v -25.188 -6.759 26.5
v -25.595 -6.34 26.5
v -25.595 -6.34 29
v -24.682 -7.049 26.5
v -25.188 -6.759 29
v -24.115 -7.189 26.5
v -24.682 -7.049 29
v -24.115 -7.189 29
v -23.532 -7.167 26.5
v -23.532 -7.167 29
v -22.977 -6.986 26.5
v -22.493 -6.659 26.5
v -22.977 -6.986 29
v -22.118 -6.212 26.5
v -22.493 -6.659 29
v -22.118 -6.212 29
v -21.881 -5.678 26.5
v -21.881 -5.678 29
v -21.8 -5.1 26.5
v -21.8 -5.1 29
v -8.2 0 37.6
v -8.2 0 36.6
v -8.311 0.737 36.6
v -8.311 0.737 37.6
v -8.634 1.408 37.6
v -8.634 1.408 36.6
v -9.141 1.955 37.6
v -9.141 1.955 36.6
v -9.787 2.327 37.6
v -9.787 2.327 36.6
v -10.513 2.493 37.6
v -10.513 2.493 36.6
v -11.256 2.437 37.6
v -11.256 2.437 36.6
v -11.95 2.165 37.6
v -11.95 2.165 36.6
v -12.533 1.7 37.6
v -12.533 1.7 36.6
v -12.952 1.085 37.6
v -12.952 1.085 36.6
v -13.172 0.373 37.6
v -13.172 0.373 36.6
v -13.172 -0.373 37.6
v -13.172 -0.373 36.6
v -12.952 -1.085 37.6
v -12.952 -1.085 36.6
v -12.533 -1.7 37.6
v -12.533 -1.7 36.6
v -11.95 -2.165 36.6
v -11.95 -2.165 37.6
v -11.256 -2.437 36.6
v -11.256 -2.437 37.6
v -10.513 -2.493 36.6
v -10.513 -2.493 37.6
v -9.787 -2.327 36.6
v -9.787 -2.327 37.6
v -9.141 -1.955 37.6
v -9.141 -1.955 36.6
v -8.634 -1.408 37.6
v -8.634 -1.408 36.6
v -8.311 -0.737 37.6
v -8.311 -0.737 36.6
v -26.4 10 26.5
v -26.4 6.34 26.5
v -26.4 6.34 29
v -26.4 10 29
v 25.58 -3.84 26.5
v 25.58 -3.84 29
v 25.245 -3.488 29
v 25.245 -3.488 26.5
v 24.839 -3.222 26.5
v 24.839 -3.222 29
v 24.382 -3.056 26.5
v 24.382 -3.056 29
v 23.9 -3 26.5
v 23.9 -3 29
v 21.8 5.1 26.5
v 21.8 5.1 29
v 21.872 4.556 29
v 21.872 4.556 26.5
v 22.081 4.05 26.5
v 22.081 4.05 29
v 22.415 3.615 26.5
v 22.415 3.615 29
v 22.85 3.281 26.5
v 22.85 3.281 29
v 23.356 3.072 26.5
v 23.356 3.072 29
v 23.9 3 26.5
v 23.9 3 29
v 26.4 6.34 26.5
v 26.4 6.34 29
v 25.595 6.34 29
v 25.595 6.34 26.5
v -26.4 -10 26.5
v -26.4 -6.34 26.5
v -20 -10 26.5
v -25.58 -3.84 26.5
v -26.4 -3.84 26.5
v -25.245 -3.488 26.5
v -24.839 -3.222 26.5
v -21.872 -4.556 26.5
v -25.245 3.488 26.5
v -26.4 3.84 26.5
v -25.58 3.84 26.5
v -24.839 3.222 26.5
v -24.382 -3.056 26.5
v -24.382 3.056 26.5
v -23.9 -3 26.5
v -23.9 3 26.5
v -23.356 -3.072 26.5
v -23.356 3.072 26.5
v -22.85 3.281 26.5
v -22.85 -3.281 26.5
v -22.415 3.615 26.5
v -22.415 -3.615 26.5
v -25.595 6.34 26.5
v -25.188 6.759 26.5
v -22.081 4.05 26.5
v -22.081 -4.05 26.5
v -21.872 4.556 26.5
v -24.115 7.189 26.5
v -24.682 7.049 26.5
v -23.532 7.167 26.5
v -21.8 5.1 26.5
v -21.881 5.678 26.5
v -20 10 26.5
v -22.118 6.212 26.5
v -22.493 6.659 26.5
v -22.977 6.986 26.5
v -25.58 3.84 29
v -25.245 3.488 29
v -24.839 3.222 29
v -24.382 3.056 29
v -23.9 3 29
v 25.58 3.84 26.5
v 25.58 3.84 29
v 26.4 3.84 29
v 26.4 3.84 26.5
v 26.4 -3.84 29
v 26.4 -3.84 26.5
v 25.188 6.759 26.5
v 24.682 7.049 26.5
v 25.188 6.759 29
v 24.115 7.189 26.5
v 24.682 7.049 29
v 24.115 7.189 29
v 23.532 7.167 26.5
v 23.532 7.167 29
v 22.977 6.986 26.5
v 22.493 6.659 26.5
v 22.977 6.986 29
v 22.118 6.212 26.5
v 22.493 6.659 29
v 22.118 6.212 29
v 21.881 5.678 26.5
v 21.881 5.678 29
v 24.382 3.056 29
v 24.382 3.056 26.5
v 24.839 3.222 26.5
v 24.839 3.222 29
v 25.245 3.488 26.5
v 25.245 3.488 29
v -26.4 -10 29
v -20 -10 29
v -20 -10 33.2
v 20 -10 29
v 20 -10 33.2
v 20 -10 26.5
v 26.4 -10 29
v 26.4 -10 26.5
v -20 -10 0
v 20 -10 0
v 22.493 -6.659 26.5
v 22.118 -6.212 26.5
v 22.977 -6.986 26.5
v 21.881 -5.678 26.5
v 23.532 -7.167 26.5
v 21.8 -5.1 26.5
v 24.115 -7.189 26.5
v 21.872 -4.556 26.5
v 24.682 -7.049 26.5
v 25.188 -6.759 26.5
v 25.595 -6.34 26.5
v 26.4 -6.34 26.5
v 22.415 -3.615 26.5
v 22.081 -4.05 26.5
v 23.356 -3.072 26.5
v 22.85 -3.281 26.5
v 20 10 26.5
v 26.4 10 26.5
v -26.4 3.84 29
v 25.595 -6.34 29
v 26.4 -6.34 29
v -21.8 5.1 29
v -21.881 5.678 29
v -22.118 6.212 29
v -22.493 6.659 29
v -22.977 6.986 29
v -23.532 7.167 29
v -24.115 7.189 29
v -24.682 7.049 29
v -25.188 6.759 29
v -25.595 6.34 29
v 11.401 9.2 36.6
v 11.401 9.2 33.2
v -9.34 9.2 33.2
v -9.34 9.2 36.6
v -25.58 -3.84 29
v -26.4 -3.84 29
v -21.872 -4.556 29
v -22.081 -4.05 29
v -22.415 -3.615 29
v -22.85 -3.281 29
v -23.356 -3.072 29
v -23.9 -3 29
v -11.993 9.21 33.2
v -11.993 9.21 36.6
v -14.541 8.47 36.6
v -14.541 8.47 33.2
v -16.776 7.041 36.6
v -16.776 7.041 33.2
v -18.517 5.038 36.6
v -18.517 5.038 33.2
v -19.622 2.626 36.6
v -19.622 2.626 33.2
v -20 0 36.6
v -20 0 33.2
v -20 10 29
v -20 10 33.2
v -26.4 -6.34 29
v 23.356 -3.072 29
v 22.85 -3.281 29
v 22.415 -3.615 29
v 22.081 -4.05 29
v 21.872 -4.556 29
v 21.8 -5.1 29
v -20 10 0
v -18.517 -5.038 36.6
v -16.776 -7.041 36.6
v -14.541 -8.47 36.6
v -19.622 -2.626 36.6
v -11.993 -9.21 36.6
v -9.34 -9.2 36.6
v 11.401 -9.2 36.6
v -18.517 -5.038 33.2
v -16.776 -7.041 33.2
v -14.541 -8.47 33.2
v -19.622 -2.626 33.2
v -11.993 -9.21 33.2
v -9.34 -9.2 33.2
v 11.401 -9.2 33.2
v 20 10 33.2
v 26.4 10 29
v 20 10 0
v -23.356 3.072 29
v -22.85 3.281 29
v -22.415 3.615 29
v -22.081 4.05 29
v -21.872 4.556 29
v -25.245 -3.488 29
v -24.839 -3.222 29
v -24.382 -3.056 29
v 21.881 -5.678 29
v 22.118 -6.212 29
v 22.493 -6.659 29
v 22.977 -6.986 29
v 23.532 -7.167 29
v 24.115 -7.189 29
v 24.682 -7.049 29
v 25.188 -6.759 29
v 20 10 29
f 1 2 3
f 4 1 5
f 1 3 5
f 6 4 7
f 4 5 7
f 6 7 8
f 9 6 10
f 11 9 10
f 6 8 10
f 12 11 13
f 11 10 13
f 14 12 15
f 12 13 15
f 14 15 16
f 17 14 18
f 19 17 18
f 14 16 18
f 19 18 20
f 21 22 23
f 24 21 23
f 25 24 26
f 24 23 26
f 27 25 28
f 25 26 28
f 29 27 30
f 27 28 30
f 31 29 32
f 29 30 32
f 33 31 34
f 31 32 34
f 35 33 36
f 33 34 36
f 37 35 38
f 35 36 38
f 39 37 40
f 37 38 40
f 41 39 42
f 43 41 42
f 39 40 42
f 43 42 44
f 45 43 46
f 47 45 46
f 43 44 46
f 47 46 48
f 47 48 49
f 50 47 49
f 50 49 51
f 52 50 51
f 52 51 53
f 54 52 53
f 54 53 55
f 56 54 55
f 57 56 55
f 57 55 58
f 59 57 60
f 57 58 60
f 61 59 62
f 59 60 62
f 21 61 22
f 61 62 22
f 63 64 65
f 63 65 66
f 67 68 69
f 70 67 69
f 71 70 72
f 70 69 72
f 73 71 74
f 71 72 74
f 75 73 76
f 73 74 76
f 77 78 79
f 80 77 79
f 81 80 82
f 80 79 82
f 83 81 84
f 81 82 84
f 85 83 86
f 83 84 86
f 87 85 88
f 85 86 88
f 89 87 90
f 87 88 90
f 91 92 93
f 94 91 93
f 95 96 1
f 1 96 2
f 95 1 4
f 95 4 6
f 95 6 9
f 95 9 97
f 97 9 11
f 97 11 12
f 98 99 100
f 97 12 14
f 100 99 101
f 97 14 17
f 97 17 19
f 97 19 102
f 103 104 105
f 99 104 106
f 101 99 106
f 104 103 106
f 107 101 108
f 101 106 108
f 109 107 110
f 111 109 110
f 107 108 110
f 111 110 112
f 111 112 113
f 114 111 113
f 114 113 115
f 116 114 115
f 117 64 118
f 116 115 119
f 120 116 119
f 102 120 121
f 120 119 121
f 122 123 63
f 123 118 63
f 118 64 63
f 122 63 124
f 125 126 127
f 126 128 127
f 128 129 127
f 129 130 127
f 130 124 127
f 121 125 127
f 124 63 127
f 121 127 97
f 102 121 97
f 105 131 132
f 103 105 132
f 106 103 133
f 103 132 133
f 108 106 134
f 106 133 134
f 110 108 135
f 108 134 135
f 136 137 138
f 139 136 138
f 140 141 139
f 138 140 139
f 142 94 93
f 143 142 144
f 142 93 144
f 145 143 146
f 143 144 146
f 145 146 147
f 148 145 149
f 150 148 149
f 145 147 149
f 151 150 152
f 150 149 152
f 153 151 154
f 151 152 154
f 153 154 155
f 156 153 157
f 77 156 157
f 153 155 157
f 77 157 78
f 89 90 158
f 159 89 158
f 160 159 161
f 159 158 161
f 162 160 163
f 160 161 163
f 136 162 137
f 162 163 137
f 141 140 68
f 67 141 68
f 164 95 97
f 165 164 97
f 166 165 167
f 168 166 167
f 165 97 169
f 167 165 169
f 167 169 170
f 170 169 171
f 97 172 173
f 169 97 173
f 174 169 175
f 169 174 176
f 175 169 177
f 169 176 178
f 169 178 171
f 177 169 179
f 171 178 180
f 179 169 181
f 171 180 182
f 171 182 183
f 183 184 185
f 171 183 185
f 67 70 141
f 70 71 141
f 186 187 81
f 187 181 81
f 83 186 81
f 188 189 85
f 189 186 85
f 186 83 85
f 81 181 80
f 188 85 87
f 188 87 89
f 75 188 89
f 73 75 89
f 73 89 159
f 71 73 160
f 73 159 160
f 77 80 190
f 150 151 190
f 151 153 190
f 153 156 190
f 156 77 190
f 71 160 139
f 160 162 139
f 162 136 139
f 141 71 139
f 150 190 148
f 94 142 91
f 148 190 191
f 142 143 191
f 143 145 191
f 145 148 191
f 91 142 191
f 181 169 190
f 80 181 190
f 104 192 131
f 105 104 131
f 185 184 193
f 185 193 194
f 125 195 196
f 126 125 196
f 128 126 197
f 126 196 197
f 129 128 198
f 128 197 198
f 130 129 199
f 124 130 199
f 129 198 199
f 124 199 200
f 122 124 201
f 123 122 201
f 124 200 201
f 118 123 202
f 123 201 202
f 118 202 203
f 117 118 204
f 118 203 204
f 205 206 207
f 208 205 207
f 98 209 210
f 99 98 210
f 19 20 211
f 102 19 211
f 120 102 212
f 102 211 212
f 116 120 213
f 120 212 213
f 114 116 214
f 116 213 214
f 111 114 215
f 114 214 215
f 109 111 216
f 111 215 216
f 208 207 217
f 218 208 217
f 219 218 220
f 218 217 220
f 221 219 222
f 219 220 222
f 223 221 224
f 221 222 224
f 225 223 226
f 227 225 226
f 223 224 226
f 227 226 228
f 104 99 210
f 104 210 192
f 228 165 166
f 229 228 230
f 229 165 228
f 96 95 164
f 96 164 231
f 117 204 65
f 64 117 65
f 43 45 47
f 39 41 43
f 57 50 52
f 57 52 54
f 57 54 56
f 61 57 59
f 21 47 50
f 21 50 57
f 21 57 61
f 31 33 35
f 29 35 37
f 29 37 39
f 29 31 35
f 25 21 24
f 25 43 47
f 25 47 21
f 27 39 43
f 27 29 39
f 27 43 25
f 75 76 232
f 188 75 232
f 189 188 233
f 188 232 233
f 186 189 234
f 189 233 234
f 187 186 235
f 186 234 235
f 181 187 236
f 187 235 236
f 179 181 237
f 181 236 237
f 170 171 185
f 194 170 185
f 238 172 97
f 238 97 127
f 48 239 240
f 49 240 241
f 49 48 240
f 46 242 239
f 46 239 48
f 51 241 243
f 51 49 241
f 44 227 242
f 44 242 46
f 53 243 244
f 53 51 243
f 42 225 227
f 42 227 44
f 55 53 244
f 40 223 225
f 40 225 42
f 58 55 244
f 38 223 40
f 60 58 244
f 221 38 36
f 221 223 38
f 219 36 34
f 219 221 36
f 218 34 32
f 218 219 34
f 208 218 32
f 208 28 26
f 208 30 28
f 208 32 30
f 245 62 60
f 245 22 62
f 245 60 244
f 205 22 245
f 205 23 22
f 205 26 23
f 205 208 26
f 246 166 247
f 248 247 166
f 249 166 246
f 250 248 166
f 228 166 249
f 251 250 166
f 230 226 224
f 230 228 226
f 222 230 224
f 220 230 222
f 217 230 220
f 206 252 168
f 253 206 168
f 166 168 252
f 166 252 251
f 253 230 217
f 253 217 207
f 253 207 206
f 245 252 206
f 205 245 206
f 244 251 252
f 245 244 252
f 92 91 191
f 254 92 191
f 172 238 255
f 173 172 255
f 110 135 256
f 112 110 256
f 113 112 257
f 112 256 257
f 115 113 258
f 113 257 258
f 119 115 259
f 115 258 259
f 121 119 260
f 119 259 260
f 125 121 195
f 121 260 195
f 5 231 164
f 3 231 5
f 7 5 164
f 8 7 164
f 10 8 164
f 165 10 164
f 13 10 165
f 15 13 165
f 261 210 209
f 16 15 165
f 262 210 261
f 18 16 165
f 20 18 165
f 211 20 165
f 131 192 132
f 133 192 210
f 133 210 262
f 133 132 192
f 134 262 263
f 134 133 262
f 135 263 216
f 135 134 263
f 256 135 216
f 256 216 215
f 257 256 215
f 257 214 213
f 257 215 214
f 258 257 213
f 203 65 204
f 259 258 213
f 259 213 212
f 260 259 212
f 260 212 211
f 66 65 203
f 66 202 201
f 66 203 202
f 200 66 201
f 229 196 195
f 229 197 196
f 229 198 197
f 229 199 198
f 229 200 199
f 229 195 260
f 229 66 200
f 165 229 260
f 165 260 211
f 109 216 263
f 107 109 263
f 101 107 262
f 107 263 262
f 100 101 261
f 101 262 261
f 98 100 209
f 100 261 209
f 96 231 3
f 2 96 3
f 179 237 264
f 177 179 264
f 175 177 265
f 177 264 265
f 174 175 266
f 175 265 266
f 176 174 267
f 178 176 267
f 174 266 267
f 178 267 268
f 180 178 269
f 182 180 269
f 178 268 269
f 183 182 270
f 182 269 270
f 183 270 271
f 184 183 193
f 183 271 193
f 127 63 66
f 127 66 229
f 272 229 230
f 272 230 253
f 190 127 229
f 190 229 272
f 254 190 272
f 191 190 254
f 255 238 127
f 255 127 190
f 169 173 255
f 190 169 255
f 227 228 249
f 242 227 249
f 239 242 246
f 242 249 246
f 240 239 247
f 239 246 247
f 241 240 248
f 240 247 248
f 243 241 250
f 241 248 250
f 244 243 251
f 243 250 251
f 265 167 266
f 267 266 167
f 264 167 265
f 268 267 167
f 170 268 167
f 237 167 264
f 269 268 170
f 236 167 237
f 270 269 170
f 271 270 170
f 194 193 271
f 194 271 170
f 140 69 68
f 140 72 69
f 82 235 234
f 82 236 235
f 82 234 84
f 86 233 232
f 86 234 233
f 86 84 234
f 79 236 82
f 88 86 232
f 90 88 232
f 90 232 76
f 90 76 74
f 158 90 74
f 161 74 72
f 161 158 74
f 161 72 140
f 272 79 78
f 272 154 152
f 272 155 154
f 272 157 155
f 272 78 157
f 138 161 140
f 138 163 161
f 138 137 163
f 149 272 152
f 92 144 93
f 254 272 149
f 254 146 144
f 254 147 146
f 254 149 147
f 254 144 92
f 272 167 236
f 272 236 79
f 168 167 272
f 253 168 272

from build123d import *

# Parameters (mm, degrees)
F0_W      = 40
F0_H      = 20
F1_DEPTH  = 26.5
F2_W      = 52.8
F2_H      = 20
F3_DEPTH  = 2.5
F4_W      = 40
F4_H      = 20
F5_DEPTH  = 4.2
F7_DEPTH  = 3.4
F8_R      = 2.5
F9_DEPTH  = 1
F11_DEPTH = 29.001


with BuildPart() as f1:
    # F0 (on Top) → F1 (new body)
    with BuildSketch(Plane.XY):
        Rectangle(F0_W, F0_H)
    extrude(amount=F1_DEPTH)

    # F2 (on face) → F3 (join)
    with BuildSketch(Plane.XY.offset(26.5)):
        Rectangle(F2_W, F2_H)
    extrude(amount=F3_DEPTH)

    # F4 (on face) → F5 (join)
    with BuildSketch(Plane.XY.offset(29)):
        Rectangle(F4_W, F4_H)
    extrude(amount=F5_DEPTH)

    # F6 (on face) → F7 (join)
    with BuildSketch(Plane.XY.offset(33.2)):
        with BuildLine():
            Line((-10.7, 9.2), (-9.3398529491, 9.2))
            ThreePointArc((-9.3398529491, 9.2), (-16.7762090282, 7.0405741134), (-20, 1.29e-08))
            ThreePointArc((-20, 1.29e-08), (-16.7762090379, -7.040574105), (-9.3398529491, -9.2))
            Line((-9.3398529491, -9.2), (-10.7, -9.2))
            Line((-10.7, -9.2), (-10.7, 9.2))
        make_face()
        with BuildLine():
            ThreePointArc((-9.3398529491, -9.2), (-3.6594258908, -6.0762090331), (-1.4, 0))
            ThreePointArc((-1.4, 0), (-3.6594258908, 6.0762090331), (-9.3398529491, 9.2))
            Line((-9.3398529491, 9.2), (-10.7, 9.2))
            Line((-10.7, 9.2), (-10.7, -9.2))
            Line((-10.7, -9.2), (-9.3398529491, -9.2))
        make_face()
        with BuildLine():
            ThreePointArc((-9.3398529491, 9.2), (-3.6594258908, 6.0762090331), (-1.4, 0))
            ThreePointArc((-1.4, 0), (-3.6594258908, -6.0762090331), (-9.3398529491, -9.2))
            Line((-9.3398529491, -9.2), (11.4008062363, -9.2))
            Line((11.4008062363, -9.2), (11.4008062363, 9.2))
            Line((11.4008062363, 9.2), (-9.3398529491, 9.2))
        make_face()
    extrude(amount=F7_DEPTH)

    # F8 (on face) → F9 (join)
    with BuildSketch(Plane.XY.offset(36.6)):
        with Locations((-10.7, 0)):
            Circle(F8_R)
    extrude(amount=F9_DEPTH)

    # F10 (on face) → F11 (cut, through all)
    with BuildSketch(Plane.XY.offset(29)):
        with BuildLine():
            Line((-23.9, 3), (-23.9, 5.1))
            Line((-23.9, 5.1), (-21.8, 5.1))
            ThreePointArc((-21.8, 5.1), (-23.2478597857, 7.0961746268), (-25.594964896, 6.3397959514))
            Line((-25.594964896, 6.3397959514), (-24.7499752088, 6.3397959514))
            Line((-24.7499752088, 6.3397959514), (-24.7499752088, 3.8397959514))
            Line((-24.7499752088, 3.8397959514), (-25.5798469442, 3.8397959514))
            ThreePointArc((-25.5798469442, 3.8397959514), (-24.839034477, 3.2216458665), (-23.9, 3))
        make_face()
        with BuildLine():
            Line((-21.8, 5.1), (-23.9, 5.1))
            Line((-23.9, 5.1), (-23.9, 3))
            ThreePointArc((-23.9, 3), (-22.4150757595, 3.6150757595), (-21.8, 5.1))
        make_face()
        with BuildLine():
            Line((-24.7499752088, 6.3397959514), (-25.594964896, 6.3397959514))
            ThreePointArc((-25.594964896, 6.3397959514), (-25.9999616042, 5.0873011527), (-25.5798469442, 3.8397959514))
            Line((-25.5798469442, 3.8397959514), (-24.7499752088, 3.8397959514))
            Line((-24.7499752088, 3.8397959514), (-24.7499752088, 6.3397959514))
        make_face()
        with BuildLine():
            Line((-23.9, -5.1), (-23.9, -3))
            ThreePointArc((-23.9, -3), (-24.839034477, -3.2216458665), (-25.5798469442, -3.8397959514))
            Line((-25.5798469442, -3.8397959514), (-24.7499752088, -3.8397959514))
            Line((-24.7499752088, -3.8397959514), (-24.7499752088, -6.3397959514))
            Line((-24.7499752088, -6.3397959514), (-25.594964896, -6.3397959514))
            ThreePointArc((-25.594964896, -6.3397959514), (-23.2478597857, -7.0961746268), (-21.8, -5.1))
            Line((-21.8, -5.1), (-23.9, -5.1))
        make_face()
        with BuildLine():
            ThreePointArc((-21.8, -5.1), (-22.4150757595, -3.6150757595), (-23.9, -3))
            Line((-23.9, -3), (-23.9, -5.1))
            Line((-23.9, -5.1), (-21.8, -5.1))
        make_face()
        with BuildLine():
            Line((-24.7499752088, -3.8397959514), (-25.5798469442, -3.8397959514))
            ThreePointArc((-25.5798469442, -3.8397959514), (-25.9999616042, -5.0873011527), (-25.594964896, -6.3397959514))
            Line((-25.594964896, -6.3397959514), (-24.7499752088, -6.3397959514))
            Line((-24.7499752088, -6.3397959514), (-24.7499752088, -3.8397959514))
        make_face()
        with BuildLine():
            ThreePointArc((26, 5.1), (25.8961746268, 5.7521402143), (25.594964896, 6.3397959514))
            Line((25.594964896, 6.3397959514), (24.7499752088, 6.3397959514))
            Line((24.7499752088, 6.3397959514), (24.7499752088, 3.8397959514))
            Line((24.7499752088, 3.8397959514), (25.5798469442, 3.8397959514))
            ThreePointArc((25.5798469442, 3.8397959514), (25.8921945918, 4.4358007012), (26, 5.1))
        make_face()
        with BuildLine():
            ThreePointArc((25.594964896, 6.3397959514), (23.2478597857, 7.0961746268), (21.8, 5.1))
            Line((21.8, 5.1), (23.9, 5.1))
            Line((23.9, 5.1), (23.9, 3))
            ThreePointArc((23.9, 3), (24.839034477, 3.2216458665), (25.5798469442, 3.8397959514))
            Line((25.5798469442, 3.8397959514), (24.7499752088, 3.8397959514))
            Line((24.7499752088, 3.8397959514), (24.7499752088, 6.3397959514))
            Line((24.7499752088, 6.3397959514), (25.594964896, 6.3397959514))
        make_face()
        with BuildLine():
            Line((23.9, 5.1), (21.8, 5.1))
            ThreePointArc((21.8, 5.1), (22.4150757595, 3.6150757595), (23.9, 3))
            Line((23.9, 3), (23.9, 5.1))
        make_face()
        with BuildLine():
            Line((27.2499752088, 6.3397959514), (25.594964896, 6.3397959514))
            ThreePointArc((25.594964896, 6.3397959514), (25.8961746268, 5.7521402143), (26, 5.1))
            ThreePointArc((26, 5.1), (25.8921945918, 4.4358007012), (25.5798469442, 3.8397959514))
            Line((25.5798469442, 3.8397959514), (27.2499752088, 3.8397959514))
            Line((27.2499752088, 3.8397959514), (27.2499752088, 6.3397959514))
        make_face()
        with BuildLine():
            ThreePointArc((26, -5.1), (25.8961746268, -5.7521402143), (25.594964896, -6.3397959514))
            Line((25.594964896, -6.3397959514), (27.2499752088, -6.3397959514))
            Line((27.2499752088, -6.3397959514), (27.2499752088, -3.8397959514))
            Line((27.2499752088, -3.8397959514), (25.5798469442, -3.8397959514))
            ThreePointArc((25.5798469442, -3.8397959514), (25.8921945918, -4.4358007012), (26, -5.1))
        make_face()
        with BuildLine():
            Line((23.9, -5.1), (21.8, -5.1))
            ThreePointArc((21.8, -5.1), (23.2478597857, -7.0961746268), (25.594964896, -6.3397959514))
            Line((25.594964896, -6.3397959514), (24.7499752088, -6.3397959514))
            Line((24.7499752088, -6.3397959514), (24.7499752088, -3.8397959514))
            Line((24.7499752088, -3.8397959514), (25.5798469442, -3.8397959514))
            ThreePointArc((25.5798469442, -3.8397959514), (24.839034477, -3.2216458665), (23.9, -3))
            Line((23.9, -3), (23.9, -5.1))
        make_face()
        with BuildLine():
            ThreePointArc((23.9, -3), (22.4150757595, -3.6150757595), (21.8, -5.1))
            Line((21.8, -5.1), (23.9, -5.1))
            Line((23.9, -5.1), (23.9, -3))
        make_face()
        with BuildLine():
            Line((24.7499752088, -6.3397959514), (25.594964896, -6.3397959514))
            ThreePointArc((25.594964896, -6.3397959514), (25.8961746268, -5.7521402143), (26, -5.1))
            ThreePointArc((26, -5.1), (25.8921945918, -4.4358007012), (25.5798469442, -3.8397959514))
            Line((25.5798469442, -3.8397959514), (24.7499752088, -3.8397959514))
            Line((24.7499752088, -3.8397959514), (24.7499752088, -6.3397959514))
        make_face()
        with BuildLine():
            ThreePointArc((-25.594964896, -6.3397959514), (-25.9999616042, -5.0873011527), (-25.5798469442, -3.8397959514))
            Line((-25.5798469442, -3.8397959514), (-26.4, -3.8397959514))
            Line((-26.4, -3.8397959514), (-26.4, -6.3397959514))
            Line((-26.4, -6.3397959514), (-25.594964896, -6.3397959514))
        make_face()
        with BuildLine():
            ThreePointArc((-25.5798469442, 3.8397959514), (-25.9999616042, 5.0873011527), (-25.594964896, 6.3397959514))
            Line((-25.594964896, 6.3397959514), (-26.4, 6.3397959514))
            Line((-26.4, 6.3397959514), (-26.4, 3.8397959514))
            Line((-26.4, 3.8397959514), (-25.5798469442, 3.8397959514))
        make_face()
    extrude(amount=-F11_DEPTH, mode=Mode.SUBTRACT)


solid = f1.part
